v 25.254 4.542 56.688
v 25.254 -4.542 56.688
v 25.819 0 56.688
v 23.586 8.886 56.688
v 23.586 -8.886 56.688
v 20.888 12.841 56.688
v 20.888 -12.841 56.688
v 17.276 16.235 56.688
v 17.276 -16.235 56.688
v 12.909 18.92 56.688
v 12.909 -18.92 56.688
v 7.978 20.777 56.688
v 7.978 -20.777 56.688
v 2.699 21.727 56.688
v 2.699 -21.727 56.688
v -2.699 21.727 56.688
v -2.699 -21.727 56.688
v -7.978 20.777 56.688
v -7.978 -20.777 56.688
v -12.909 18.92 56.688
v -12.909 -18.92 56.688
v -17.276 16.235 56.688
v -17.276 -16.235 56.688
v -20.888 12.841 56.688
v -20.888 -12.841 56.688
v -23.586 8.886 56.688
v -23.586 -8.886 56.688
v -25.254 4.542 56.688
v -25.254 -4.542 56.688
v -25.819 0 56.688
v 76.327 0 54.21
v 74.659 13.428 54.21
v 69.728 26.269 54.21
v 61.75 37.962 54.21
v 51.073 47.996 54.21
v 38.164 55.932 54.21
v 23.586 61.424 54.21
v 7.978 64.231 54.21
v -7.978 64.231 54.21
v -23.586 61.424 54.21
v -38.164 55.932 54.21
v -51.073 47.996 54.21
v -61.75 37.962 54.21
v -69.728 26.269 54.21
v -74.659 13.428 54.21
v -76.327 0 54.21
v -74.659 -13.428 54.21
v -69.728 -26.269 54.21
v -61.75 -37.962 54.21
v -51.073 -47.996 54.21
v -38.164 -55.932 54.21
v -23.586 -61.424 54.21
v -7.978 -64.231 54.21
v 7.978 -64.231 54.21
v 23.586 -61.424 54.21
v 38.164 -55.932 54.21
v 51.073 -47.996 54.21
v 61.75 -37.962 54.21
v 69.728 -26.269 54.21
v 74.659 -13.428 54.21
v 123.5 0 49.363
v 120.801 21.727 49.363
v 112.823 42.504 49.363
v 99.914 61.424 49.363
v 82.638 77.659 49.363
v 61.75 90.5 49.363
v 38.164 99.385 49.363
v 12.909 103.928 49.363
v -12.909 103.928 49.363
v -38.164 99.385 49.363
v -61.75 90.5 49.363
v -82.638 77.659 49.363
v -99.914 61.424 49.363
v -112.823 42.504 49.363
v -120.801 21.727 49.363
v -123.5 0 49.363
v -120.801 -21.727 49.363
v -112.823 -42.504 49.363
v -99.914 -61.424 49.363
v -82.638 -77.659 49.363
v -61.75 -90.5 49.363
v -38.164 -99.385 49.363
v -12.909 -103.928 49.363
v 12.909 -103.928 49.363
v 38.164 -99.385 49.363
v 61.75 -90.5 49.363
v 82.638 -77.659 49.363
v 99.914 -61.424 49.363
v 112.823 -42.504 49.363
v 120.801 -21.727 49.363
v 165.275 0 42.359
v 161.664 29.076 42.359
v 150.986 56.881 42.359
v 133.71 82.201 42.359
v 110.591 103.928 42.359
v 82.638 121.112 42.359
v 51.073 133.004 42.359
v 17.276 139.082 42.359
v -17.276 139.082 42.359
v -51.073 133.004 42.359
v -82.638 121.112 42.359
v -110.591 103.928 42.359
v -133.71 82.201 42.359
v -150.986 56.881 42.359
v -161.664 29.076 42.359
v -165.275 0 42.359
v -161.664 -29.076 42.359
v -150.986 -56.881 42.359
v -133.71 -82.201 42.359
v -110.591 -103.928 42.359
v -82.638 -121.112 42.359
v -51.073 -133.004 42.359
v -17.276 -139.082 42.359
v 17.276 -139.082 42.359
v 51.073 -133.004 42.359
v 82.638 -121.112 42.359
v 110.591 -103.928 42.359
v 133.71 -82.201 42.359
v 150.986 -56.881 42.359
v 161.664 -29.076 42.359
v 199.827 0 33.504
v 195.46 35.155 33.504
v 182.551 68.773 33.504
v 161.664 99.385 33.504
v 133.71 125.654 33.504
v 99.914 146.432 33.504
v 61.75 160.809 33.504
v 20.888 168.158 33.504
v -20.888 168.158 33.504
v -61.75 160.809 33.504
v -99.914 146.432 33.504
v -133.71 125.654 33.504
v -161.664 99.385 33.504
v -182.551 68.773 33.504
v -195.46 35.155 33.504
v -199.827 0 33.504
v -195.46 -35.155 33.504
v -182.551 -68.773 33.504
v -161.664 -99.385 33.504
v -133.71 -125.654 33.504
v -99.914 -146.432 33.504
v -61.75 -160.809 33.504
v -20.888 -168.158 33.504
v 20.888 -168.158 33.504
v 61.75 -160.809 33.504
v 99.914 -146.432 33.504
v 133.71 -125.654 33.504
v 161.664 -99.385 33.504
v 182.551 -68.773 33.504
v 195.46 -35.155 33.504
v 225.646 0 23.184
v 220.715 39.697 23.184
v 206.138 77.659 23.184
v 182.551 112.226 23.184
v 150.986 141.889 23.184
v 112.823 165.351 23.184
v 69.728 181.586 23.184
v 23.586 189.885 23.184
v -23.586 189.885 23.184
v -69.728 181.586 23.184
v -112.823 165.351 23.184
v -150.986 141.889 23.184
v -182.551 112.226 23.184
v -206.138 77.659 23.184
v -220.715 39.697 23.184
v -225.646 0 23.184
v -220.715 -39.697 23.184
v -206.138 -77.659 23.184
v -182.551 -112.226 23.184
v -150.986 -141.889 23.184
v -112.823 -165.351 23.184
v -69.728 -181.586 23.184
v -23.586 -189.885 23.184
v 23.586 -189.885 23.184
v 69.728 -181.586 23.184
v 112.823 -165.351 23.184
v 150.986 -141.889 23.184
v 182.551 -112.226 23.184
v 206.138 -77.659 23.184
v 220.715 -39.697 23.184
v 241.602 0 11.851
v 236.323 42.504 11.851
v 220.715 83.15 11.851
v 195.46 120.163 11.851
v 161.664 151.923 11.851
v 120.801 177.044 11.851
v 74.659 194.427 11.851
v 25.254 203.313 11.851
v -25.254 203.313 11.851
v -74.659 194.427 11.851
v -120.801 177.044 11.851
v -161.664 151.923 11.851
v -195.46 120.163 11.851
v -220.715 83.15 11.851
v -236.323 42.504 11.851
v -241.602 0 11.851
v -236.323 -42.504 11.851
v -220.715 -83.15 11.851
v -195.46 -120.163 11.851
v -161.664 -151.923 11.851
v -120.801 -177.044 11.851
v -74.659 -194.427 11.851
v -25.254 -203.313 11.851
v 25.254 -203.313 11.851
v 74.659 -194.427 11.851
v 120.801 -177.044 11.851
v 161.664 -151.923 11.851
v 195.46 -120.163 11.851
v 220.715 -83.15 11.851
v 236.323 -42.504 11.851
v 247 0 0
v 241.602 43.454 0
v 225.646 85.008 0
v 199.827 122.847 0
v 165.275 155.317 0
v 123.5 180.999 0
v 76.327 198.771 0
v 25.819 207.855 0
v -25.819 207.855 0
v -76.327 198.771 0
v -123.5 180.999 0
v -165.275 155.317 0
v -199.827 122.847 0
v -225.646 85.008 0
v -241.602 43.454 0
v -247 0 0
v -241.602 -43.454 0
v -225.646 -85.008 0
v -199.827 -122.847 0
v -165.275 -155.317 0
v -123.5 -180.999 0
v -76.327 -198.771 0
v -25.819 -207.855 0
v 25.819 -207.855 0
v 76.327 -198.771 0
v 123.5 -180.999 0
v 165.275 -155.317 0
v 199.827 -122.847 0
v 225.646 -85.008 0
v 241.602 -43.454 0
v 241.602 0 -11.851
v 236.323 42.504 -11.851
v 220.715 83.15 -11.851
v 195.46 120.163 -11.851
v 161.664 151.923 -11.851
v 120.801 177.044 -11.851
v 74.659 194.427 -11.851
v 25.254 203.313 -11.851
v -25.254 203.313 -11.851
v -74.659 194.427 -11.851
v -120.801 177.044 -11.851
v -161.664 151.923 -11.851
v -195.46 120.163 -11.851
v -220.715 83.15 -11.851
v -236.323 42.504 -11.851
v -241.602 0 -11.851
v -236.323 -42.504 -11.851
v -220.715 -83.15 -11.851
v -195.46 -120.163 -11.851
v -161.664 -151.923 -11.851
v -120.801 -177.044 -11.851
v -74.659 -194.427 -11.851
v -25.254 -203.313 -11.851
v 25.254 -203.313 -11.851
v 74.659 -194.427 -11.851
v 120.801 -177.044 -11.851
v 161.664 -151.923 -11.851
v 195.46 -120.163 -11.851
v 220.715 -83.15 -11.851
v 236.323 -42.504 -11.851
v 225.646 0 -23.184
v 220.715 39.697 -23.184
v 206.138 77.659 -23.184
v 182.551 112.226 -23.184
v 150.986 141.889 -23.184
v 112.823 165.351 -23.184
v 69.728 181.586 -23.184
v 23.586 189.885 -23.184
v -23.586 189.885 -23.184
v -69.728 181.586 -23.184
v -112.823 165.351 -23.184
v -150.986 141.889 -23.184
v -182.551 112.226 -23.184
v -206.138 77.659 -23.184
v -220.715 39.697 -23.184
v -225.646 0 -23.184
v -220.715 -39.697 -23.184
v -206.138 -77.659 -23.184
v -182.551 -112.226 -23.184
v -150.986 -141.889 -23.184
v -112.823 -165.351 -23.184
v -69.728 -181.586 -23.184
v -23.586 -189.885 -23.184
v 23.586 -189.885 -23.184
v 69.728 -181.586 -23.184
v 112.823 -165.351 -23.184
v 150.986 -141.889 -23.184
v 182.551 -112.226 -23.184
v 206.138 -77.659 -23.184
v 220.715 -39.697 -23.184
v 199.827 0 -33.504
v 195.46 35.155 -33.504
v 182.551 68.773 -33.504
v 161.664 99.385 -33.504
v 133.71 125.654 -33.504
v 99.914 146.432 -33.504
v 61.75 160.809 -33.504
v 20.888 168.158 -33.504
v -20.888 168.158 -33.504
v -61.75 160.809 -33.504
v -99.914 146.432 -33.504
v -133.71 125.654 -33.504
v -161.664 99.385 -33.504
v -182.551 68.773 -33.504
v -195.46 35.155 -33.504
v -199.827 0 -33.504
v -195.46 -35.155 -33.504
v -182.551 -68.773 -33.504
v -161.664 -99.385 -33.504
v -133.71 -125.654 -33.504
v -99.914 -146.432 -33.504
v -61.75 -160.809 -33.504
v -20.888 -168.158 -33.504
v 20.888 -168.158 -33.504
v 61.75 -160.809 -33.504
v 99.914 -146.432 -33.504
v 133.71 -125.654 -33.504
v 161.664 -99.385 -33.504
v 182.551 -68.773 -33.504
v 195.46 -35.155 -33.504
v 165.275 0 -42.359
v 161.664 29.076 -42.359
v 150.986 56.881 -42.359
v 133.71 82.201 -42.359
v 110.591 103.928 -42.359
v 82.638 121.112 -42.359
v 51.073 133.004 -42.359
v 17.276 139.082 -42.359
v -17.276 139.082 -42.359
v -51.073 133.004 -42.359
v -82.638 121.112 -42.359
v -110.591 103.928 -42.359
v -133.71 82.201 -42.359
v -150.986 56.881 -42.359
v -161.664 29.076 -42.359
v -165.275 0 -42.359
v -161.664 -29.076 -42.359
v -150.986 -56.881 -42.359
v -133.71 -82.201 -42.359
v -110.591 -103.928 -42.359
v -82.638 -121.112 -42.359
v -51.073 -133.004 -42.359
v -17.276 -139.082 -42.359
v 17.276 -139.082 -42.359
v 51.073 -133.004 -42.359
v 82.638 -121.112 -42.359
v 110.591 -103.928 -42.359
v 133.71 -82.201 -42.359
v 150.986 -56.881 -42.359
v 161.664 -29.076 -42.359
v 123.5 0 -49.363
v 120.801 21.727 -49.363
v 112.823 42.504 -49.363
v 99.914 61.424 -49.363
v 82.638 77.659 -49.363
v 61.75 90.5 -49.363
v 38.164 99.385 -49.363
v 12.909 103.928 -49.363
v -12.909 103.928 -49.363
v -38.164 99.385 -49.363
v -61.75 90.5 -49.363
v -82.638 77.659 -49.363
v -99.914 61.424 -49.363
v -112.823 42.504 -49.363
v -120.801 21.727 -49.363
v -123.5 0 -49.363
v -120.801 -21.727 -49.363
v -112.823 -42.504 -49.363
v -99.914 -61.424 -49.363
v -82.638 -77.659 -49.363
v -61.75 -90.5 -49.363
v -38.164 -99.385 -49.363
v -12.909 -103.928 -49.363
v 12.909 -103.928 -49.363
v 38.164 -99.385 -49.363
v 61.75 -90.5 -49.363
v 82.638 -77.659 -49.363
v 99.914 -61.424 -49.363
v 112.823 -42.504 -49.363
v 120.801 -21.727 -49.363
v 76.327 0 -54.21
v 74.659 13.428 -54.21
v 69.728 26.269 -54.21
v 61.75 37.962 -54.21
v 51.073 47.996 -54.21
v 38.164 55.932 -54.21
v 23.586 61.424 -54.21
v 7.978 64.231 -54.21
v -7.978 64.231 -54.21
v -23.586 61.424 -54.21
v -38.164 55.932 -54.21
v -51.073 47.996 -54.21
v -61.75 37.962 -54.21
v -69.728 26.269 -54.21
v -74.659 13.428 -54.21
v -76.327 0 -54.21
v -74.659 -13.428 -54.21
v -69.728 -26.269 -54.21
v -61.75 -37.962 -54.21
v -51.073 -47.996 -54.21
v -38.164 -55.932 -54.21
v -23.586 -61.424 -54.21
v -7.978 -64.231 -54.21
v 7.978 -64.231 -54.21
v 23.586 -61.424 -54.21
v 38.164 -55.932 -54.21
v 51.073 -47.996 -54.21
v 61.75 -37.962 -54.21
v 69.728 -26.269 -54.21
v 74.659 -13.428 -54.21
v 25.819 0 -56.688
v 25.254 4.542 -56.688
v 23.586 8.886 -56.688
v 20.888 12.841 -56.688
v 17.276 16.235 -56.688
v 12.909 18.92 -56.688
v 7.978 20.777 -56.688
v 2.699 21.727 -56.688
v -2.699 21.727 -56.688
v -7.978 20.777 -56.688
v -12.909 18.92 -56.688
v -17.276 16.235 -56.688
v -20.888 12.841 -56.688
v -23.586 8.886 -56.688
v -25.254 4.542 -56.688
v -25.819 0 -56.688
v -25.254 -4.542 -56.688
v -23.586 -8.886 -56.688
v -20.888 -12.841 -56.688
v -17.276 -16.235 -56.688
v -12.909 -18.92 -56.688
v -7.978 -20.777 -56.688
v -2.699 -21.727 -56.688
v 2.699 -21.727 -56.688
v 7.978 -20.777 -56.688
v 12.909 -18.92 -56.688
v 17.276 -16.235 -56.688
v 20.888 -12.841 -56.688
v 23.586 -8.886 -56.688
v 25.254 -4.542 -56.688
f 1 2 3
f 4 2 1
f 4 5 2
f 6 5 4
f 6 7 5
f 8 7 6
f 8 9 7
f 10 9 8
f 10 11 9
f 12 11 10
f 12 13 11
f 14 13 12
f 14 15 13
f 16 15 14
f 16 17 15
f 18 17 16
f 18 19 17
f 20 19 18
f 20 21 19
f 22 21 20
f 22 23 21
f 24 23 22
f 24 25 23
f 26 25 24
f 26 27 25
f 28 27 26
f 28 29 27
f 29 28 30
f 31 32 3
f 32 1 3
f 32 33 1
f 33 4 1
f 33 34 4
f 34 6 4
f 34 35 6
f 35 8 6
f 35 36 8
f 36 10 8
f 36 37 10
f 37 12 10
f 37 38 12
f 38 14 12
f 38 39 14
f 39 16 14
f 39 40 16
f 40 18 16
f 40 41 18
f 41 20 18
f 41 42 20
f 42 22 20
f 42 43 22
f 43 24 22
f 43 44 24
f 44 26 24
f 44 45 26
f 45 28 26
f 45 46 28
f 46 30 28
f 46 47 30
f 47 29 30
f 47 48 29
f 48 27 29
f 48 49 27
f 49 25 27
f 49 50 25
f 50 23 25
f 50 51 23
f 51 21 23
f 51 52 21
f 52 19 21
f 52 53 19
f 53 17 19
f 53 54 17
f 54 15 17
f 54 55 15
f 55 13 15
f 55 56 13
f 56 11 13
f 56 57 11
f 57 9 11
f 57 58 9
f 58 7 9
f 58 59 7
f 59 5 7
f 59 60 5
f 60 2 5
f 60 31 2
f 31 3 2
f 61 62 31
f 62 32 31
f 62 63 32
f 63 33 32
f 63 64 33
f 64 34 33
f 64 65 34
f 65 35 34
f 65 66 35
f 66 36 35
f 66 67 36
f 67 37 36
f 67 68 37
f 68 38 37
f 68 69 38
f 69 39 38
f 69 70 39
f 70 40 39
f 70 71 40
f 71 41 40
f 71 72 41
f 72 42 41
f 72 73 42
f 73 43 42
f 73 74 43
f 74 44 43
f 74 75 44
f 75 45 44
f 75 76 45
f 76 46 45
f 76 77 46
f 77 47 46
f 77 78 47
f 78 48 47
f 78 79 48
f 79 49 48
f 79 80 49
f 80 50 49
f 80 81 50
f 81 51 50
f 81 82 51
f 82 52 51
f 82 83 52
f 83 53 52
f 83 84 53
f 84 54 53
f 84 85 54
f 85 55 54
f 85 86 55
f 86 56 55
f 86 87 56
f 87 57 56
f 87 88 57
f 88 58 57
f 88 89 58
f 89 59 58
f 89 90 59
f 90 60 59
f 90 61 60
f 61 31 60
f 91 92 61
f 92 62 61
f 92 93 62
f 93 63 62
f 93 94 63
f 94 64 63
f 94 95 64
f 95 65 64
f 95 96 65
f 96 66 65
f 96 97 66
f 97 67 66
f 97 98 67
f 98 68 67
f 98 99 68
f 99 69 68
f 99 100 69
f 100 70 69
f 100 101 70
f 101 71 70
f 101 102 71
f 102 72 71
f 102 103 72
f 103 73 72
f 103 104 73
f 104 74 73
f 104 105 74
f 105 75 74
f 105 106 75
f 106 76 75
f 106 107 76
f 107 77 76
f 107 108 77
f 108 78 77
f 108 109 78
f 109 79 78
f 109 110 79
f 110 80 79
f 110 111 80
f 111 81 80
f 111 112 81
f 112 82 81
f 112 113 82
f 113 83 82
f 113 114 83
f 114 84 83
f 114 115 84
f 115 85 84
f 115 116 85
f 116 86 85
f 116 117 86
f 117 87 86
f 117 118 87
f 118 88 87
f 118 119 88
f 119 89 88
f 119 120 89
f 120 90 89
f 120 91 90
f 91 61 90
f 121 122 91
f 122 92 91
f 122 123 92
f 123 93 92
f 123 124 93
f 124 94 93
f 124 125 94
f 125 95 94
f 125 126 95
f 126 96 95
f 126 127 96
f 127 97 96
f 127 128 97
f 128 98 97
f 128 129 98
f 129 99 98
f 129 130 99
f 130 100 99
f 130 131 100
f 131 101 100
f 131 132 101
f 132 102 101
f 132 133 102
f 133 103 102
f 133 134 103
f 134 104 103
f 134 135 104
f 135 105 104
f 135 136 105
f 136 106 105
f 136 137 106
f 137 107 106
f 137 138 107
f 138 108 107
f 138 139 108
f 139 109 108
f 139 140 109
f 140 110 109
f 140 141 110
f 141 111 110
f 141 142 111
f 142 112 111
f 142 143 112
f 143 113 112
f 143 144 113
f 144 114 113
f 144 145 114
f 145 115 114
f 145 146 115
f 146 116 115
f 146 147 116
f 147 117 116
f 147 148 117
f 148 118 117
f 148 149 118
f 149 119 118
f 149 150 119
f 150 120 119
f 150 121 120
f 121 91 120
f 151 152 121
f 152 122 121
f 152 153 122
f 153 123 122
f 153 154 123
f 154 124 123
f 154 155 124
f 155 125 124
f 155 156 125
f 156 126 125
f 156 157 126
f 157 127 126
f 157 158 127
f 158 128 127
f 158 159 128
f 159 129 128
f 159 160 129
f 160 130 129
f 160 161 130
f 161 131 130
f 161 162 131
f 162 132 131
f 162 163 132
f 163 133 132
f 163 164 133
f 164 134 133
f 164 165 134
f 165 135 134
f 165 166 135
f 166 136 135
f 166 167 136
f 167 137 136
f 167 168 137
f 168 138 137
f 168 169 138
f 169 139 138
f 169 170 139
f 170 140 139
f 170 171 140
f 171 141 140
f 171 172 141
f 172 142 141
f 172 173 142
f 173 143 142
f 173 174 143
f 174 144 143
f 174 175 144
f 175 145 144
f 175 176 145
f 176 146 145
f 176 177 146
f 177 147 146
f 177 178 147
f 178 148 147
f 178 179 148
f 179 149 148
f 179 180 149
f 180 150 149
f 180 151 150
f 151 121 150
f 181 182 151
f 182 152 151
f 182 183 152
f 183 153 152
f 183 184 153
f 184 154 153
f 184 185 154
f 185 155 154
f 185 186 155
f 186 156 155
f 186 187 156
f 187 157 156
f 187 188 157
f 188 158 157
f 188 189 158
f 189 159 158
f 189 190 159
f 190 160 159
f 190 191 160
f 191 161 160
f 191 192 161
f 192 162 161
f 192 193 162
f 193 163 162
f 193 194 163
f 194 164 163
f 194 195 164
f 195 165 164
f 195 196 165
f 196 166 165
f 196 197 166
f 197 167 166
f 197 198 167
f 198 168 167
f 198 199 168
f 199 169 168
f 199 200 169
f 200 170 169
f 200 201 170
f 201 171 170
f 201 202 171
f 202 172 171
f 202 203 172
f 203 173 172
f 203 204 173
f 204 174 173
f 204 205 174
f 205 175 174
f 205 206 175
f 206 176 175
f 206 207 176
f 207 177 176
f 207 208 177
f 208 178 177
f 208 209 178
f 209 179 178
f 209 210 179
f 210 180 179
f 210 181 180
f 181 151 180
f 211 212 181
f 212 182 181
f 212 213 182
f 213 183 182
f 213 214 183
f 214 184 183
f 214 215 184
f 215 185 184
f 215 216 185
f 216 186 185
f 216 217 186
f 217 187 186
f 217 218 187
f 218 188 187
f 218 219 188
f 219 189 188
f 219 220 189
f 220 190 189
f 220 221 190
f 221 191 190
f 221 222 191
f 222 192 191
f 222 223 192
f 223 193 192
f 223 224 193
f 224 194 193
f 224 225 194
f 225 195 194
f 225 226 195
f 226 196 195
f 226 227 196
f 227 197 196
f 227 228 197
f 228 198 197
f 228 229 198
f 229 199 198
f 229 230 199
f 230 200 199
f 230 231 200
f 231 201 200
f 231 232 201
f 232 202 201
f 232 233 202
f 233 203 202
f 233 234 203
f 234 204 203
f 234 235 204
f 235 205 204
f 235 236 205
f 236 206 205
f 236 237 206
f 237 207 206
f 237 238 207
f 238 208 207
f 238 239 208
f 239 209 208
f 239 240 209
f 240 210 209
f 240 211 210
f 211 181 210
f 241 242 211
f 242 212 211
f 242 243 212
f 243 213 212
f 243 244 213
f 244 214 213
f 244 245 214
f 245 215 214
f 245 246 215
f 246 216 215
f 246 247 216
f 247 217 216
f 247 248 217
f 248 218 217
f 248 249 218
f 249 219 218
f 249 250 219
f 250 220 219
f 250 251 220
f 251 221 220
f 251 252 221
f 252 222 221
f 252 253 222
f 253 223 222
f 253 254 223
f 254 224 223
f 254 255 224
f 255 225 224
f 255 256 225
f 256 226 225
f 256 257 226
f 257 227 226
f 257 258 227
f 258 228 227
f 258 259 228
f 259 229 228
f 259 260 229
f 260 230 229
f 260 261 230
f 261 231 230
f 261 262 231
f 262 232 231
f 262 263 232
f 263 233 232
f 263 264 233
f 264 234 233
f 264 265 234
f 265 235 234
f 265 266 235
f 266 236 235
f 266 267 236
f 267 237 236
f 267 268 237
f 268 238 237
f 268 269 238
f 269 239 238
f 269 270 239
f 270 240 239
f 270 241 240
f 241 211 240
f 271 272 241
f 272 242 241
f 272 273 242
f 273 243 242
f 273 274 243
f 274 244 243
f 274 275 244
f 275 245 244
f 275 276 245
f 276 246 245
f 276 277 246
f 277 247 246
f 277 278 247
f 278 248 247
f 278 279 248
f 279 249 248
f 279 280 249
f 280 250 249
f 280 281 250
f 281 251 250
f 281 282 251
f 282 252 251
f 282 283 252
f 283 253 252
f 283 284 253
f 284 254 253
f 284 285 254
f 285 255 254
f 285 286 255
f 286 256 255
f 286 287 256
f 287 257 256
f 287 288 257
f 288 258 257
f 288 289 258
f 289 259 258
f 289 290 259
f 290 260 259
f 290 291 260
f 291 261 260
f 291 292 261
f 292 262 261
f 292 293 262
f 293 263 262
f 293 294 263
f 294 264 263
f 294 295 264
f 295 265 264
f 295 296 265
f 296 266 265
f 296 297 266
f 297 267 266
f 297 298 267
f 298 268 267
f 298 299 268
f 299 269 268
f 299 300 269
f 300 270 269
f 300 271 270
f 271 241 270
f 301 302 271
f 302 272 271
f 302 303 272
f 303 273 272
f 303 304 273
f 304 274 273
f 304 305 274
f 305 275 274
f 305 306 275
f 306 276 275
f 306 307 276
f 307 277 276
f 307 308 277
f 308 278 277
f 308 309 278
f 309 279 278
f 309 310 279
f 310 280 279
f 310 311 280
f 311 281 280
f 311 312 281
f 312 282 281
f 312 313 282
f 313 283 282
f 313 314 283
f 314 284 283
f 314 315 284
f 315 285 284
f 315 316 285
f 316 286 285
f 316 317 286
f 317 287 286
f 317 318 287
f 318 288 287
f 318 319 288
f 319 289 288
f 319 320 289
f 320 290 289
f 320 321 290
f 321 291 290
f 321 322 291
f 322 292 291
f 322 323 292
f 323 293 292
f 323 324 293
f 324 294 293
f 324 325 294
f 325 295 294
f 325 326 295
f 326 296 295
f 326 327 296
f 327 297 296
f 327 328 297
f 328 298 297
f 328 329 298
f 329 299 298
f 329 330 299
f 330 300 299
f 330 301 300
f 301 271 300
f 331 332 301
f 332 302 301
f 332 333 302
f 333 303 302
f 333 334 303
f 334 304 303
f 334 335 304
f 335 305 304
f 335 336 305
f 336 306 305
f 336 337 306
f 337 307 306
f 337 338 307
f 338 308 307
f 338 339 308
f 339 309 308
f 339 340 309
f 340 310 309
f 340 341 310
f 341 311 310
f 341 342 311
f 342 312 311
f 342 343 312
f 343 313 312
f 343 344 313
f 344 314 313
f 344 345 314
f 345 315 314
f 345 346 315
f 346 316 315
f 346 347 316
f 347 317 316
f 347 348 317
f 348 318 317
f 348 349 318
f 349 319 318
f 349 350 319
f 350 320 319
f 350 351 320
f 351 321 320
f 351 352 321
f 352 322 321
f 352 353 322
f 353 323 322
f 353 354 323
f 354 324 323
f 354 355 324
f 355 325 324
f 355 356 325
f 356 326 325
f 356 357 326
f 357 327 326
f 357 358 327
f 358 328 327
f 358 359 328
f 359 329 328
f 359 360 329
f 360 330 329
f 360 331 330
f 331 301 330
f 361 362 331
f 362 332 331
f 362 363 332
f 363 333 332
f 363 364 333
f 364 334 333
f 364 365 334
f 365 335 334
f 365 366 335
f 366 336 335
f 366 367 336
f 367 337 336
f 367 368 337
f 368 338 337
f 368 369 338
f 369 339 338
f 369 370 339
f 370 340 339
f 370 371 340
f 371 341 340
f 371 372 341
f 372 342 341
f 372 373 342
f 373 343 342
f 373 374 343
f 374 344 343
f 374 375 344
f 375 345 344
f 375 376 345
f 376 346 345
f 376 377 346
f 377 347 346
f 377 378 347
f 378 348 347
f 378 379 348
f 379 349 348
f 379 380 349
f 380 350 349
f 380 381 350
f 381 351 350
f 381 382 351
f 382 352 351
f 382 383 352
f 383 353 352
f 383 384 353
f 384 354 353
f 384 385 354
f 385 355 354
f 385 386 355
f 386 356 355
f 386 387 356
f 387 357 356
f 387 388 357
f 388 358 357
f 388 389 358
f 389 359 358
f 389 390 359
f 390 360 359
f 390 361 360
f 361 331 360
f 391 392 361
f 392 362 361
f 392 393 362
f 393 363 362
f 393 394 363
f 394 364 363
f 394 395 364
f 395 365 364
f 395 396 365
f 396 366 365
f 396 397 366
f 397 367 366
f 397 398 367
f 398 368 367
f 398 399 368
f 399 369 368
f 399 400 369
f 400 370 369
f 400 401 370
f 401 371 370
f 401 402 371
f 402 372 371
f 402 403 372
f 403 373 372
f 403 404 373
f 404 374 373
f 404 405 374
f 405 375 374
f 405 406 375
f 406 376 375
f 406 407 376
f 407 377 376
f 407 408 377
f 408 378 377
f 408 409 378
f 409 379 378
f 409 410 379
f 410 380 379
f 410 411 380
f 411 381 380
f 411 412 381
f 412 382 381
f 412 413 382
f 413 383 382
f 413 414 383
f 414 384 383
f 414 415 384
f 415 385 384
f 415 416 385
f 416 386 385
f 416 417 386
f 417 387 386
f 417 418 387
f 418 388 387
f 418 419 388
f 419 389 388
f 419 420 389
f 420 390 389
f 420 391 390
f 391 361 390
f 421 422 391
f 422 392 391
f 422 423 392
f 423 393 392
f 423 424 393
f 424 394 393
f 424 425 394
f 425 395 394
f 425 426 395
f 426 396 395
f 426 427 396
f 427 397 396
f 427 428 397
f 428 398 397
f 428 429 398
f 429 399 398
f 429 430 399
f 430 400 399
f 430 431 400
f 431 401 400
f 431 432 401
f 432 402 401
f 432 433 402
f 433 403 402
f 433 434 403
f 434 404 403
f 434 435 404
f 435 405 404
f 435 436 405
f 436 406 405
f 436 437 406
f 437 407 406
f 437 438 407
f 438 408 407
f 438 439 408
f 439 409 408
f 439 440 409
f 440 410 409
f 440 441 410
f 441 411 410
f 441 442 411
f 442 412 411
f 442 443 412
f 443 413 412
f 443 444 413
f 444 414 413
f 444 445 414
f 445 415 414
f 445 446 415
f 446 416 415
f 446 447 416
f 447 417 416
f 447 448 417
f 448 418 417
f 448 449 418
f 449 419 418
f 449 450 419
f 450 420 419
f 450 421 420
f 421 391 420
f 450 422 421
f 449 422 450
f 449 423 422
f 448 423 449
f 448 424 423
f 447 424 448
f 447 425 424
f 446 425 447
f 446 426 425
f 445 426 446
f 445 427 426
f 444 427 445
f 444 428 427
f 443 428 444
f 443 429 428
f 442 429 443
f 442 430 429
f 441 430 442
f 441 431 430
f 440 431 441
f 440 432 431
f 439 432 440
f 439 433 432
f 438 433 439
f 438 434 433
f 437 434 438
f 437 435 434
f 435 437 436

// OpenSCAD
// Generated by SolidPython 1.0.1 on 2020-07-29 00:46:50


scale(v = [13, 11, 3]) {
	sphere(r = 19);
}
/***********************************************
*********      SolidPython code:      **********
************************************************
 
# import packages: SolidPython
from solid import *
from solid.utils import *
from itertools import chain, combinations, permutations


class Resize:

    def __init__(self, scad_file):
        self.scad_file = scad_file
        #self.scad_file = import_scad(scad_file)
        # cone/cylinder param:
        self.r1 = 0
        self.r2 = 0
        self.h = 0
        # rectangular prism param:
        self.w = 0
        self.l = 0
        # ellipse param:
        self.r = 0

    # import OpenScad code (file name corresponds to shape)


    # classify shape + parameters
    def assign(self, param1, param2, param3):
        if self.scad_file == 'cone.scad':
            self.r1 = param1
            self.r2 = param2
            self.h = param3
        elif self.scad_file == 'cylinder.scad':
            self.r1 = param1
            self.r2 = param2
            self.h = param3
        elif self.scad_file == 'rectangularPrism.scad':
            self.h = param1
            self.l = param2
            self.w = param3
        else:
            self.r = param1
            self.h = param2

    # resize parameters
    def iterate(self):
        x = range(3, 20, 2)
        i = 1
        if self.scad_file == 'cone.scad':
            tempList = list(permutations(x, 2))
            for temp in tempList:
                param1 = temp[0]
                param2 = temp[1]
                filepath = 'produced_scad_files/' + 'cone' + str(param1) + '_' + str(param2) + '_' + '.scad'
                scad_render_to_file(cylinder(h=param1, r1=param2, r2=0), filepath)

        elif self.scad_file == 'cylinder.scad':
            tempList = list(permutations(x, 3))
            for temp in tempList:
                param1 = temp[0]
                param2 = temp[1]
                filepath = 'produced_scad_files/' + 'cylinder' + str(param1) + '_' + str(param2) + '_' + '.scad'
                scad_render_to_file(cylinder(h=param1, r1=param2, r2=param2), filepath)

        elif self.scad_file == 'rectangularPrism.scad':
            tempList = list(permutations(x, 3))
            for temp in tempList:
                param1 = temp[0]
                param2 = temp[1]
                param3 = temp[2]
                filepath = 'produced_scad_files/' + 'rectangularPrism' + str(param1) + '_' + str(param2) + '_' + str(
                    param3) + '.scad'
                scad_render_to_file(cube(size=(param1, param2, param3)), filepath)

        elif self.scad_file == 'ellipse.scad':
            tempList = list(permutations(x, 4))
            for temp in tempList:
                param1 = temp[0]
                param2 = temp[1]
                param3 = temp[2]
                param4 = temp[3]
                filepath = 'produced_scad_files/' + 'ellipse' + str(param1) + '_' + str(param2) + '_' + str(param3) + '_' + str(param4) + '.scad'
                scad_render_to_file(scale([param1, param2, param3])(sphere(r=param4)), filepath)

    def render_to_scadfile(self):
        scad_render_to_file(scad, 'example.scad') 
 
************************************************/
